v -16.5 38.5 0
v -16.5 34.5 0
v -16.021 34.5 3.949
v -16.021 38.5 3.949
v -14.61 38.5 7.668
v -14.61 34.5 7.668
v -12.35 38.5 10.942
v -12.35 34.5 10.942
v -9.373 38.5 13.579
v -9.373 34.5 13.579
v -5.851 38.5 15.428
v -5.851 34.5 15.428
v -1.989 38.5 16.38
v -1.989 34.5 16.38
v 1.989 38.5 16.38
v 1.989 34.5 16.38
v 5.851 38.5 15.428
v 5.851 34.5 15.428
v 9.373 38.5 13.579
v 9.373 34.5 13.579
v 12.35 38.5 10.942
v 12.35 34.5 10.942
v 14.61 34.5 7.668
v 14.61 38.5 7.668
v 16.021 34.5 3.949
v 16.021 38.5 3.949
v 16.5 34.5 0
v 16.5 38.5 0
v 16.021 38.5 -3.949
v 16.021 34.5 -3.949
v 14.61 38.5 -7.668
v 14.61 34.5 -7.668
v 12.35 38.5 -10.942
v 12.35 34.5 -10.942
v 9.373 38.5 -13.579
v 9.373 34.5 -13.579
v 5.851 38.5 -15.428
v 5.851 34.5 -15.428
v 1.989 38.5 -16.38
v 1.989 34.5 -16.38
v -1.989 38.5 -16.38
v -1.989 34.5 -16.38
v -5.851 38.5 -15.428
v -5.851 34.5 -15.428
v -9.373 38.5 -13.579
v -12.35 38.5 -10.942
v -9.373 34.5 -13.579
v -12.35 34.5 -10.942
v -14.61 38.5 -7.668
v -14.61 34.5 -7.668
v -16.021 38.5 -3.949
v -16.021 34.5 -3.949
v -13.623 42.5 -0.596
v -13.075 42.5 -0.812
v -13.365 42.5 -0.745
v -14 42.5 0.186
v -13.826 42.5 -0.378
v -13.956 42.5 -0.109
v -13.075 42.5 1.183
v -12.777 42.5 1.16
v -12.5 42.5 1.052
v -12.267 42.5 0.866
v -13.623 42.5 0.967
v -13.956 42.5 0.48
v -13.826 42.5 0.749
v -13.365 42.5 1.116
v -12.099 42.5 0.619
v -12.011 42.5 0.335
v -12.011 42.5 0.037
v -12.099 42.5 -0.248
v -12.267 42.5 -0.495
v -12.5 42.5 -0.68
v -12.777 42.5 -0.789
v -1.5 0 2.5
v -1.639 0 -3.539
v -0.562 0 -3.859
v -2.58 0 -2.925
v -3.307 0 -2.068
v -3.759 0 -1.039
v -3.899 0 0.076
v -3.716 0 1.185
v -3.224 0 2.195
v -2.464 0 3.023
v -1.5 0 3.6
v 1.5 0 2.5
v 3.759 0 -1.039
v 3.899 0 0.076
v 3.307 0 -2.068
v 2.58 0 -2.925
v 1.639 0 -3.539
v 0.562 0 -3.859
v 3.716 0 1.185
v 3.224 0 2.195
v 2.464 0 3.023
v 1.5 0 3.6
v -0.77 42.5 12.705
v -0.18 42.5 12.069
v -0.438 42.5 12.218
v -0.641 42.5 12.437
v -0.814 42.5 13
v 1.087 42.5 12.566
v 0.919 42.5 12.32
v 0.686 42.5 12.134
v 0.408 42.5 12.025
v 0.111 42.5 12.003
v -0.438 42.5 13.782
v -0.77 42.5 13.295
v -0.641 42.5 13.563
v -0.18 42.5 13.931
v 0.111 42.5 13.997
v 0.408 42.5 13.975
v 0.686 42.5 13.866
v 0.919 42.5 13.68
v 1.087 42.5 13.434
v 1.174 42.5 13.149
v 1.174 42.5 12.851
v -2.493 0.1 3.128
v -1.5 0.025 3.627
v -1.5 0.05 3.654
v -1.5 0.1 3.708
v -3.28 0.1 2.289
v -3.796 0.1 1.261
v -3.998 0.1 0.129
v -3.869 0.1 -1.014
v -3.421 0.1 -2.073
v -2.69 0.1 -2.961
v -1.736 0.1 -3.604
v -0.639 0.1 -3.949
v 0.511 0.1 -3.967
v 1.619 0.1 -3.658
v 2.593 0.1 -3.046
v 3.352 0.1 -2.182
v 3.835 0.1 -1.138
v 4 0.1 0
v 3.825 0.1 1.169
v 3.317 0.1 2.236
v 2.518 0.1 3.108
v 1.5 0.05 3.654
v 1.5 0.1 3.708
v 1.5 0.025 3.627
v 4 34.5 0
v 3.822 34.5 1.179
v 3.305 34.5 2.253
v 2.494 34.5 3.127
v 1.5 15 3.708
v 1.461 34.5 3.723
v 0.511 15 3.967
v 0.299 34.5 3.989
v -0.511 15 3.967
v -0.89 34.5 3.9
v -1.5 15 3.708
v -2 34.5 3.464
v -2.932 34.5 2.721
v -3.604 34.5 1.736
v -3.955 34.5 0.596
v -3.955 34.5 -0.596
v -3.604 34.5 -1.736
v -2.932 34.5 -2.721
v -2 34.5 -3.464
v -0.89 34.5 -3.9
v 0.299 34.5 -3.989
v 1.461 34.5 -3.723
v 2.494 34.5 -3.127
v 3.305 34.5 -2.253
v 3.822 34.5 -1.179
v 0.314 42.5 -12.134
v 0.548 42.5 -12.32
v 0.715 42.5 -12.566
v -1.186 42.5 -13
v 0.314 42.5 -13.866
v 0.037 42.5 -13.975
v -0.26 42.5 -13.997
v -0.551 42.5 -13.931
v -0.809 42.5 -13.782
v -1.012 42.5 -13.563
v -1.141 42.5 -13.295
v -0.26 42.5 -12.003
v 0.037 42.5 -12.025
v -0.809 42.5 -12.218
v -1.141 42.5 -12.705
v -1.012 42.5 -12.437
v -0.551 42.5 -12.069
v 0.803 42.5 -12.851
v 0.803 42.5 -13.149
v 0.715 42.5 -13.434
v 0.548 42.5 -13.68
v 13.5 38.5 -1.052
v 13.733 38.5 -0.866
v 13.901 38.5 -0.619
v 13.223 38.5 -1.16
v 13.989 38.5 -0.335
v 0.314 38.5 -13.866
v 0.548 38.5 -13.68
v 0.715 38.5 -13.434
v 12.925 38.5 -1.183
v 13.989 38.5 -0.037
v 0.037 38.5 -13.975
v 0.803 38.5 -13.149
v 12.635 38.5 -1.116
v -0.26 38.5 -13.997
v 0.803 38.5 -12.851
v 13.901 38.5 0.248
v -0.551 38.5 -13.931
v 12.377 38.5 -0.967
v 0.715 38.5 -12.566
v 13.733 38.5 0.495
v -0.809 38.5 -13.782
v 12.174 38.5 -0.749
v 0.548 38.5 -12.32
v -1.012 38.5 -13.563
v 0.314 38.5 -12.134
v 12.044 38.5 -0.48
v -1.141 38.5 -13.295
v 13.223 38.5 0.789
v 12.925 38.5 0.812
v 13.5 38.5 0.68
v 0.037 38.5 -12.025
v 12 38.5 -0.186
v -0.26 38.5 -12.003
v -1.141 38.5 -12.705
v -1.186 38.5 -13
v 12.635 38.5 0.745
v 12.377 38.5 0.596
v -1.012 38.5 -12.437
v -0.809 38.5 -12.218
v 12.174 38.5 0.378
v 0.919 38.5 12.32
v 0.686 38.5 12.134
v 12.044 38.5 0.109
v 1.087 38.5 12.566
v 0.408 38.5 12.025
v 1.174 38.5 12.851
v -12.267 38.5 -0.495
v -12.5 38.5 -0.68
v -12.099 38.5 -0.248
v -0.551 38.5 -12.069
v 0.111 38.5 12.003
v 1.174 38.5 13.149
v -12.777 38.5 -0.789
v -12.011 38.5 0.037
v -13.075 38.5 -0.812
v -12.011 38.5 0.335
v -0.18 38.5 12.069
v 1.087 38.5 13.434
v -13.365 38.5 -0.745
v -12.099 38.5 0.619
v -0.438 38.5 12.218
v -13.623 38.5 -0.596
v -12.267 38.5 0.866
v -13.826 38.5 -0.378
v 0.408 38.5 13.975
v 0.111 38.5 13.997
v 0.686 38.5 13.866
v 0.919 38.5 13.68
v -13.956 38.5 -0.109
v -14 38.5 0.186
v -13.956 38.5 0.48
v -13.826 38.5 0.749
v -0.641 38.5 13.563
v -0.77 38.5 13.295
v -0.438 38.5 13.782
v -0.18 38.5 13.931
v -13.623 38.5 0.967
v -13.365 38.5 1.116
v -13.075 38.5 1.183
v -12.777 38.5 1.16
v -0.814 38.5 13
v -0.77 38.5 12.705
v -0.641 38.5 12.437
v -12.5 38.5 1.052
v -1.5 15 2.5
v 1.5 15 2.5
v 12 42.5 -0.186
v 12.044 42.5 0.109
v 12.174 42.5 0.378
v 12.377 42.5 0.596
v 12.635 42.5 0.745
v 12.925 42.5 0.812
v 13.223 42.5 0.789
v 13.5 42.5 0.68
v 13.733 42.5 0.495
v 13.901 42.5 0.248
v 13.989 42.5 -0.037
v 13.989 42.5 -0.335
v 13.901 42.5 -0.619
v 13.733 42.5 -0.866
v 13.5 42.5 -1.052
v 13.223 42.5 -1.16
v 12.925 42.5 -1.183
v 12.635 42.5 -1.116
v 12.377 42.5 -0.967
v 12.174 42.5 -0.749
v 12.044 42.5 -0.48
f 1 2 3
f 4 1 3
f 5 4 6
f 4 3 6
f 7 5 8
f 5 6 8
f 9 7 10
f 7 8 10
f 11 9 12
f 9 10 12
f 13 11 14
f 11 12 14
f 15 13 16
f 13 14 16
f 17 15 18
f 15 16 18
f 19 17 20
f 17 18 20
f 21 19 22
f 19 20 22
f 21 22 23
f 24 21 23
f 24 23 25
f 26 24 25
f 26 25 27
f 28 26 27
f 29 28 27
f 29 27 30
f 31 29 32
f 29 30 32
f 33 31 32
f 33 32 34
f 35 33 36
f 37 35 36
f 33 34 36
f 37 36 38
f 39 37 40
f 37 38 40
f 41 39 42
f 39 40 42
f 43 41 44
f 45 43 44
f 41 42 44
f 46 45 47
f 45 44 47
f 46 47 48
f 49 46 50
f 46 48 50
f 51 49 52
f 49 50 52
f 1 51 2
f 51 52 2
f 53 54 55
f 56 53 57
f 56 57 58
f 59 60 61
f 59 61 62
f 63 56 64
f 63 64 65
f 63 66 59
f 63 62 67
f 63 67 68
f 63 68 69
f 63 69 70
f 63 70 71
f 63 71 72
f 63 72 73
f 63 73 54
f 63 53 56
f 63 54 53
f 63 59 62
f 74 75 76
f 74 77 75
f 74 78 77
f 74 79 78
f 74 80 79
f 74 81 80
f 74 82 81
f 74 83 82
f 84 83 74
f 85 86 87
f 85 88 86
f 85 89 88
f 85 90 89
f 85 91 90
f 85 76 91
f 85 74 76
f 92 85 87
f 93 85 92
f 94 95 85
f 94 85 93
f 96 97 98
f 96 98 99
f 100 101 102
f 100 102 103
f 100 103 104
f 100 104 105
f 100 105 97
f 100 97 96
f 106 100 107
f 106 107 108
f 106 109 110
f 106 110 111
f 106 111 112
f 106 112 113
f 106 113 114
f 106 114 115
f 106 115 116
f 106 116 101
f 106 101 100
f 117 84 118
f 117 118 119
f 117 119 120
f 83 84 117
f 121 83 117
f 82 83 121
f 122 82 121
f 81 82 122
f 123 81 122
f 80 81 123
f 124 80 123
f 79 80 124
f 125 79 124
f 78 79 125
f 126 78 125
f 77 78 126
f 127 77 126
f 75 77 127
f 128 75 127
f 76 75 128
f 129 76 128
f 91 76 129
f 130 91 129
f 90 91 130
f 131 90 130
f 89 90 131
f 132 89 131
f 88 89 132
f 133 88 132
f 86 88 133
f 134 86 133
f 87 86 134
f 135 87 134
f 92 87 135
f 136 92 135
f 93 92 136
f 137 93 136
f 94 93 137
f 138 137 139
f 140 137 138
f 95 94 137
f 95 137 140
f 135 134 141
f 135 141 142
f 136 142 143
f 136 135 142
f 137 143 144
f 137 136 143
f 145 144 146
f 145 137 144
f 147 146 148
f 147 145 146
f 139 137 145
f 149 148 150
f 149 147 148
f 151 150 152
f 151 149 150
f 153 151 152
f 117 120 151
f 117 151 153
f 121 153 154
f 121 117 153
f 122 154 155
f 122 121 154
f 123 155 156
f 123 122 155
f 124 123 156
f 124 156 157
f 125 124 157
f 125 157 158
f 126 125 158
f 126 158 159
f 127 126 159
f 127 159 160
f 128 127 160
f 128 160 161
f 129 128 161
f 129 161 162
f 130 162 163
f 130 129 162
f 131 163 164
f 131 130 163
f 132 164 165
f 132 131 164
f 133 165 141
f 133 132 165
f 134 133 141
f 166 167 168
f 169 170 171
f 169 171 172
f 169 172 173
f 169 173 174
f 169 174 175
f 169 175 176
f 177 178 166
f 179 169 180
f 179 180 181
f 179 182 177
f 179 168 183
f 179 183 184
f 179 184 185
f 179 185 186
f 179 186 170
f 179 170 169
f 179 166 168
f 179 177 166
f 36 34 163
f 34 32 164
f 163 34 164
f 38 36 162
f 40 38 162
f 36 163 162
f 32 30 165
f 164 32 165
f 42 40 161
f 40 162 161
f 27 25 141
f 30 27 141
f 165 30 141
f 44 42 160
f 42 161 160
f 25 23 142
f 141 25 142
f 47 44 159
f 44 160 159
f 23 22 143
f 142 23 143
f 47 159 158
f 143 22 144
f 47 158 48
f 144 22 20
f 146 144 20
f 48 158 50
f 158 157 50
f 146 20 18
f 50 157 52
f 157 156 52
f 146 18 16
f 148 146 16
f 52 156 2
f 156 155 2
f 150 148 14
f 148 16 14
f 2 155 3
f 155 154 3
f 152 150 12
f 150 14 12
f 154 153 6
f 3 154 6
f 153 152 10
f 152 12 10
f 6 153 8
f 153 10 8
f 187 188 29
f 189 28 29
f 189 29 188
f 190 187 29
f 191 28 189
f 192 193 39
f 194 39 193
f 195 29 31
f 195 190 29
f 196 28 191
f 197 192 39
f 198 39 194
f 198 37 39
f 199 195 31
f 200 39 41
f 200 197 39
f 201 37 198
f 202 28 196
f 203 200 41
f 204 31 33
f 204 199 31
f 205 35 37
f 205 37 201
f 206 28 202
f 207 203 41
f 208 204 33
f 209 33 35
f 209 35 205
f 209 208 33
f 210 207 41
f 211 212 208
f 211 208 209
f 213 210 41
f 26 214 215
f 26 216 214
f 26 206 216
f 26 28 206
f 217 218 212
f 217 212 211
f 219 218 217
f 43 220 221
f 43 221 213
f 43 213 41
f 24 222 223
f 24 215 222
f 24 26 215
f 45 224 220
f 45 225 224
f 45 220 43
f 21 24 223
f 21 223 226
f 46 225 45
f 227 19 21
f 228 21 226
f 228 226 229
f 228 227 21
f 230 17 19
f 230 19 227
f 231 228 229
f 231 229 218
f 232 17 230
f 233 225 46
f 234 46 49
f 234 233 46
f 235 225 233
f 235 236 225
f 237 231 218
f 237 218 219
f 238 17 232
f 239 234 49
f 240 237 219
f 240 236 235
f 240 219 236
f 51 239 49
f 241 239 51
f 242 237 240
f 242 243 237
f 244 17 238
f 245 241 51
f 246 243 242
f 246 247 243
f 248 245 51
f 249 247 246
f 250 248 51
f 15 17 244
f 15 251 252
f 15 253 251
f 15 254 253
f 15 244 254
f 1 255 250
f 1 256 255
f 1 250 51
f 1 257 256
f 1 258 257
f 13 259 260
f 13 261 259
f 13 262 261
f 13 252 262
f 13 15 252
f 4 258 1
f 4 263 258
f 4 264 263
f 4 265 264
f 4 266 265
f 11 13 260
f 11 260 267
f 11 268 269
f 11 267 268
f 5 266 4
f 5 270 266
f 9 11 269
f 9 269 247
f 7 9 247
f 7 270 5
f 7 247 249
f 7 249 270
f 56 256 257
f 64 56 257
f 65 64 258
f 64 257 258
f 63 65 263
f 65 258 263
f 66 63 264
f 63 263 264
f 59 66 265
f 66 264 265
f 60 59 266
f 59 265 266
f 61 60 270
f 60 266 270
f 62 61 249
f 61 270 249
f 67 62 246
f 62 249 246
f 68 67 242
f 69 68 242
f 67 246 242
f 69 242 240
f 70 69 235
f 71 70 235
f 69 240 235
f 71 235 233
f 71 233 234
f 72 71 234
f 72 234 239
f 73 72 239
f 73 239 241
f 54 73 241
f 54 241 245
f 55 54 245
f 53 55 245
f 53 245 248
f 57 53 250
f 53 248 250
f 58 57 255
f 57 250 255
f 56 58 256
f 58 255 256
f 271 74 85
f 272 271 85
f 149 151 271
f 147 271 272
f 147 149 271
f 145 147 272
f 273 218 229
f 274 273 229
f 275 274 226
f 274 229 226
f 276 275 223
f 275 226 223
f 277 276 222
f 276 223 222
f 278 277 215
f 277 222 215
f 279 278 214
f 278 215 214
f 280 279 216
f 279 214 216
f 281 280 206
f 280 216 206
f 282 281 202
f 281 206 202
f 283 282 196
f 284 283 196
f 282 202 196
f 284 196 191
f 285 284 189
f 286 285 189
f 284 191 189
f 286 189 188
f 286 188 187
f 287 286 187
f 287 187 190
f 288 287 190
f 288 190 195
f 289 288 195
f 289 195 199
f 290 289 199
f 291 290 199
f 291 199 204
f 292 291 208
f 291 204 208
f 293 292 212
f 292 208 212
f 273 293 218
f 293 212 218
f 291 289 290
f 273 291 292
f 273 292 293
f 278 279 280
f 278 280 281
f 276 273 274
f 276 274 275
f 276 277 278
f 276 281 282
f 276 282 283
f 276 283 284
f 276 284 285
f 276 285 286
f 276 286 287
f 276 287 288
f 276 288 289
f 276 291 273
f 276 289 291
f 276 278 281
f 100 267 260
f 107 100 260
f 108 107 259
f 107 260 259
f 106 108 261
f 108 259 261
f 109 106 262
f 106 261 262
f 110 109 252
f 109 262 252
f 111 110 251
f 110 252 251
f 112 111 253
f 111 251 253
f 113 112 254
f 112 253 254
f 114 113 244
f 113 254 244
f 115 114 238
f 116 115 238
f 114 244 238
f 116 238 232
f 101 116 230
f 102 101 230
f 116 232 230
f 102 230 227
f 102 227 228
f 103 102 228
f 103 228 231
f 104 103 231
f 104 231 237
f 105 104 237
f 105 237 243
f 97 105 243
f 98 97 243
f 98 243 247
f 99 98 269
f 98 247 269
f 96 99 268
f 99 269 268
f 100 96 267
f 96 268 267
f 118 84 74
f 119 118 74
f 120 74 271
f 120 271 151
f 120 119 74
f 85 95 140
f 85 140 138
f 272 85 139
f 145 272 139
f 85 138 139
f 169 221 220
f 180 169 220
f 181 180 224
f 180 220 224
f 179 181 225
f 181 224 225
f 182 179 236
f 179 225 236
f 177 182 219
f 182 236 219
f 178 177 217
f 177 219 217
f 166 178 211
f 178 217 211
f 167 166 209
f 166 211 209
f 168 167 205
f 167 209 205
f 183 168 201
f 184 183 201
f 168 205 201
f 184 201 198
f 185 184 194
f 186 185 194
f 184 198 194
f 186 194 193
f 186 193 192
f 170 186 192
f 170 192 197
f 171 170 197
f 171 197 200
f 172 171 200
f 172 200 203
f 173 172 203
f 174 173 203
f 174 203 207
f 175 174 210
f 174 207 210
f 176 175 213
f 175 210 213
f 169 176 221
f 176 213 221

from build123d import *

# Parameters (mm, degrees)
F0_R     = 4
F1_DEPTH = 34.5
F3_SIZE  = 0.1
F2_W     = 3
F2_H     = 1.5
F4_DEPTH = 15
F5_R     = 16.5
F6_DEPTH = 4
F7_R     = 1
F8_DEPTH = 4


with BuildPart() as f1:
    # F0 (on Front) → F1 (new body)
    with BuildSketch(Plane.XZ):
        Circle(F0_R)
    extrude(amount=-F1_DEPTH)

    # F3
    f3_edges = [f1.edges().sort_by_distance(p)[0] for p in [
        (-4, 0, 0),
    ]]
    chamfer(f3_edges, length=F3_SIZE)

    # F2 (on Front) → F4 (cut)
    with BuildSketch(Plane.XZ):
        with Locations((0, 3.25)):
            Rectangle(F2_W, F2_H)
    extrude(amount=-F4_DEPTH, mode=Mode.SUBTRACT)

    # F5 (on face) → F6 (join)
    with BuildSketch(Plane(origin=(0, 34.5, 0), x_dir=(-1, 0, 0), z_dir=(0, 1, 0))):
        Circle(F5_R)
    extrude(amount=F6_DEPTH)

    # F7 (on face) → F8 (join)
    with BuildSketch(Plane(origin=(0, 38.5, 0), x_dir=(-1, 0, 0), z_dir=(0, 1, 0))):
        with Locations((-0.185544, 13)):
            Circle(F7_R)
        with Locations((-13, -0.185544)):
            Circle(F7_R)
        with Locations((0.185544, -13)):
            Circle(F7_R)
        with Locations((13, 0.185544)):
            Circle(F7_R)
    extrude(amount=F8_DEPTH)


solid = f1.part
